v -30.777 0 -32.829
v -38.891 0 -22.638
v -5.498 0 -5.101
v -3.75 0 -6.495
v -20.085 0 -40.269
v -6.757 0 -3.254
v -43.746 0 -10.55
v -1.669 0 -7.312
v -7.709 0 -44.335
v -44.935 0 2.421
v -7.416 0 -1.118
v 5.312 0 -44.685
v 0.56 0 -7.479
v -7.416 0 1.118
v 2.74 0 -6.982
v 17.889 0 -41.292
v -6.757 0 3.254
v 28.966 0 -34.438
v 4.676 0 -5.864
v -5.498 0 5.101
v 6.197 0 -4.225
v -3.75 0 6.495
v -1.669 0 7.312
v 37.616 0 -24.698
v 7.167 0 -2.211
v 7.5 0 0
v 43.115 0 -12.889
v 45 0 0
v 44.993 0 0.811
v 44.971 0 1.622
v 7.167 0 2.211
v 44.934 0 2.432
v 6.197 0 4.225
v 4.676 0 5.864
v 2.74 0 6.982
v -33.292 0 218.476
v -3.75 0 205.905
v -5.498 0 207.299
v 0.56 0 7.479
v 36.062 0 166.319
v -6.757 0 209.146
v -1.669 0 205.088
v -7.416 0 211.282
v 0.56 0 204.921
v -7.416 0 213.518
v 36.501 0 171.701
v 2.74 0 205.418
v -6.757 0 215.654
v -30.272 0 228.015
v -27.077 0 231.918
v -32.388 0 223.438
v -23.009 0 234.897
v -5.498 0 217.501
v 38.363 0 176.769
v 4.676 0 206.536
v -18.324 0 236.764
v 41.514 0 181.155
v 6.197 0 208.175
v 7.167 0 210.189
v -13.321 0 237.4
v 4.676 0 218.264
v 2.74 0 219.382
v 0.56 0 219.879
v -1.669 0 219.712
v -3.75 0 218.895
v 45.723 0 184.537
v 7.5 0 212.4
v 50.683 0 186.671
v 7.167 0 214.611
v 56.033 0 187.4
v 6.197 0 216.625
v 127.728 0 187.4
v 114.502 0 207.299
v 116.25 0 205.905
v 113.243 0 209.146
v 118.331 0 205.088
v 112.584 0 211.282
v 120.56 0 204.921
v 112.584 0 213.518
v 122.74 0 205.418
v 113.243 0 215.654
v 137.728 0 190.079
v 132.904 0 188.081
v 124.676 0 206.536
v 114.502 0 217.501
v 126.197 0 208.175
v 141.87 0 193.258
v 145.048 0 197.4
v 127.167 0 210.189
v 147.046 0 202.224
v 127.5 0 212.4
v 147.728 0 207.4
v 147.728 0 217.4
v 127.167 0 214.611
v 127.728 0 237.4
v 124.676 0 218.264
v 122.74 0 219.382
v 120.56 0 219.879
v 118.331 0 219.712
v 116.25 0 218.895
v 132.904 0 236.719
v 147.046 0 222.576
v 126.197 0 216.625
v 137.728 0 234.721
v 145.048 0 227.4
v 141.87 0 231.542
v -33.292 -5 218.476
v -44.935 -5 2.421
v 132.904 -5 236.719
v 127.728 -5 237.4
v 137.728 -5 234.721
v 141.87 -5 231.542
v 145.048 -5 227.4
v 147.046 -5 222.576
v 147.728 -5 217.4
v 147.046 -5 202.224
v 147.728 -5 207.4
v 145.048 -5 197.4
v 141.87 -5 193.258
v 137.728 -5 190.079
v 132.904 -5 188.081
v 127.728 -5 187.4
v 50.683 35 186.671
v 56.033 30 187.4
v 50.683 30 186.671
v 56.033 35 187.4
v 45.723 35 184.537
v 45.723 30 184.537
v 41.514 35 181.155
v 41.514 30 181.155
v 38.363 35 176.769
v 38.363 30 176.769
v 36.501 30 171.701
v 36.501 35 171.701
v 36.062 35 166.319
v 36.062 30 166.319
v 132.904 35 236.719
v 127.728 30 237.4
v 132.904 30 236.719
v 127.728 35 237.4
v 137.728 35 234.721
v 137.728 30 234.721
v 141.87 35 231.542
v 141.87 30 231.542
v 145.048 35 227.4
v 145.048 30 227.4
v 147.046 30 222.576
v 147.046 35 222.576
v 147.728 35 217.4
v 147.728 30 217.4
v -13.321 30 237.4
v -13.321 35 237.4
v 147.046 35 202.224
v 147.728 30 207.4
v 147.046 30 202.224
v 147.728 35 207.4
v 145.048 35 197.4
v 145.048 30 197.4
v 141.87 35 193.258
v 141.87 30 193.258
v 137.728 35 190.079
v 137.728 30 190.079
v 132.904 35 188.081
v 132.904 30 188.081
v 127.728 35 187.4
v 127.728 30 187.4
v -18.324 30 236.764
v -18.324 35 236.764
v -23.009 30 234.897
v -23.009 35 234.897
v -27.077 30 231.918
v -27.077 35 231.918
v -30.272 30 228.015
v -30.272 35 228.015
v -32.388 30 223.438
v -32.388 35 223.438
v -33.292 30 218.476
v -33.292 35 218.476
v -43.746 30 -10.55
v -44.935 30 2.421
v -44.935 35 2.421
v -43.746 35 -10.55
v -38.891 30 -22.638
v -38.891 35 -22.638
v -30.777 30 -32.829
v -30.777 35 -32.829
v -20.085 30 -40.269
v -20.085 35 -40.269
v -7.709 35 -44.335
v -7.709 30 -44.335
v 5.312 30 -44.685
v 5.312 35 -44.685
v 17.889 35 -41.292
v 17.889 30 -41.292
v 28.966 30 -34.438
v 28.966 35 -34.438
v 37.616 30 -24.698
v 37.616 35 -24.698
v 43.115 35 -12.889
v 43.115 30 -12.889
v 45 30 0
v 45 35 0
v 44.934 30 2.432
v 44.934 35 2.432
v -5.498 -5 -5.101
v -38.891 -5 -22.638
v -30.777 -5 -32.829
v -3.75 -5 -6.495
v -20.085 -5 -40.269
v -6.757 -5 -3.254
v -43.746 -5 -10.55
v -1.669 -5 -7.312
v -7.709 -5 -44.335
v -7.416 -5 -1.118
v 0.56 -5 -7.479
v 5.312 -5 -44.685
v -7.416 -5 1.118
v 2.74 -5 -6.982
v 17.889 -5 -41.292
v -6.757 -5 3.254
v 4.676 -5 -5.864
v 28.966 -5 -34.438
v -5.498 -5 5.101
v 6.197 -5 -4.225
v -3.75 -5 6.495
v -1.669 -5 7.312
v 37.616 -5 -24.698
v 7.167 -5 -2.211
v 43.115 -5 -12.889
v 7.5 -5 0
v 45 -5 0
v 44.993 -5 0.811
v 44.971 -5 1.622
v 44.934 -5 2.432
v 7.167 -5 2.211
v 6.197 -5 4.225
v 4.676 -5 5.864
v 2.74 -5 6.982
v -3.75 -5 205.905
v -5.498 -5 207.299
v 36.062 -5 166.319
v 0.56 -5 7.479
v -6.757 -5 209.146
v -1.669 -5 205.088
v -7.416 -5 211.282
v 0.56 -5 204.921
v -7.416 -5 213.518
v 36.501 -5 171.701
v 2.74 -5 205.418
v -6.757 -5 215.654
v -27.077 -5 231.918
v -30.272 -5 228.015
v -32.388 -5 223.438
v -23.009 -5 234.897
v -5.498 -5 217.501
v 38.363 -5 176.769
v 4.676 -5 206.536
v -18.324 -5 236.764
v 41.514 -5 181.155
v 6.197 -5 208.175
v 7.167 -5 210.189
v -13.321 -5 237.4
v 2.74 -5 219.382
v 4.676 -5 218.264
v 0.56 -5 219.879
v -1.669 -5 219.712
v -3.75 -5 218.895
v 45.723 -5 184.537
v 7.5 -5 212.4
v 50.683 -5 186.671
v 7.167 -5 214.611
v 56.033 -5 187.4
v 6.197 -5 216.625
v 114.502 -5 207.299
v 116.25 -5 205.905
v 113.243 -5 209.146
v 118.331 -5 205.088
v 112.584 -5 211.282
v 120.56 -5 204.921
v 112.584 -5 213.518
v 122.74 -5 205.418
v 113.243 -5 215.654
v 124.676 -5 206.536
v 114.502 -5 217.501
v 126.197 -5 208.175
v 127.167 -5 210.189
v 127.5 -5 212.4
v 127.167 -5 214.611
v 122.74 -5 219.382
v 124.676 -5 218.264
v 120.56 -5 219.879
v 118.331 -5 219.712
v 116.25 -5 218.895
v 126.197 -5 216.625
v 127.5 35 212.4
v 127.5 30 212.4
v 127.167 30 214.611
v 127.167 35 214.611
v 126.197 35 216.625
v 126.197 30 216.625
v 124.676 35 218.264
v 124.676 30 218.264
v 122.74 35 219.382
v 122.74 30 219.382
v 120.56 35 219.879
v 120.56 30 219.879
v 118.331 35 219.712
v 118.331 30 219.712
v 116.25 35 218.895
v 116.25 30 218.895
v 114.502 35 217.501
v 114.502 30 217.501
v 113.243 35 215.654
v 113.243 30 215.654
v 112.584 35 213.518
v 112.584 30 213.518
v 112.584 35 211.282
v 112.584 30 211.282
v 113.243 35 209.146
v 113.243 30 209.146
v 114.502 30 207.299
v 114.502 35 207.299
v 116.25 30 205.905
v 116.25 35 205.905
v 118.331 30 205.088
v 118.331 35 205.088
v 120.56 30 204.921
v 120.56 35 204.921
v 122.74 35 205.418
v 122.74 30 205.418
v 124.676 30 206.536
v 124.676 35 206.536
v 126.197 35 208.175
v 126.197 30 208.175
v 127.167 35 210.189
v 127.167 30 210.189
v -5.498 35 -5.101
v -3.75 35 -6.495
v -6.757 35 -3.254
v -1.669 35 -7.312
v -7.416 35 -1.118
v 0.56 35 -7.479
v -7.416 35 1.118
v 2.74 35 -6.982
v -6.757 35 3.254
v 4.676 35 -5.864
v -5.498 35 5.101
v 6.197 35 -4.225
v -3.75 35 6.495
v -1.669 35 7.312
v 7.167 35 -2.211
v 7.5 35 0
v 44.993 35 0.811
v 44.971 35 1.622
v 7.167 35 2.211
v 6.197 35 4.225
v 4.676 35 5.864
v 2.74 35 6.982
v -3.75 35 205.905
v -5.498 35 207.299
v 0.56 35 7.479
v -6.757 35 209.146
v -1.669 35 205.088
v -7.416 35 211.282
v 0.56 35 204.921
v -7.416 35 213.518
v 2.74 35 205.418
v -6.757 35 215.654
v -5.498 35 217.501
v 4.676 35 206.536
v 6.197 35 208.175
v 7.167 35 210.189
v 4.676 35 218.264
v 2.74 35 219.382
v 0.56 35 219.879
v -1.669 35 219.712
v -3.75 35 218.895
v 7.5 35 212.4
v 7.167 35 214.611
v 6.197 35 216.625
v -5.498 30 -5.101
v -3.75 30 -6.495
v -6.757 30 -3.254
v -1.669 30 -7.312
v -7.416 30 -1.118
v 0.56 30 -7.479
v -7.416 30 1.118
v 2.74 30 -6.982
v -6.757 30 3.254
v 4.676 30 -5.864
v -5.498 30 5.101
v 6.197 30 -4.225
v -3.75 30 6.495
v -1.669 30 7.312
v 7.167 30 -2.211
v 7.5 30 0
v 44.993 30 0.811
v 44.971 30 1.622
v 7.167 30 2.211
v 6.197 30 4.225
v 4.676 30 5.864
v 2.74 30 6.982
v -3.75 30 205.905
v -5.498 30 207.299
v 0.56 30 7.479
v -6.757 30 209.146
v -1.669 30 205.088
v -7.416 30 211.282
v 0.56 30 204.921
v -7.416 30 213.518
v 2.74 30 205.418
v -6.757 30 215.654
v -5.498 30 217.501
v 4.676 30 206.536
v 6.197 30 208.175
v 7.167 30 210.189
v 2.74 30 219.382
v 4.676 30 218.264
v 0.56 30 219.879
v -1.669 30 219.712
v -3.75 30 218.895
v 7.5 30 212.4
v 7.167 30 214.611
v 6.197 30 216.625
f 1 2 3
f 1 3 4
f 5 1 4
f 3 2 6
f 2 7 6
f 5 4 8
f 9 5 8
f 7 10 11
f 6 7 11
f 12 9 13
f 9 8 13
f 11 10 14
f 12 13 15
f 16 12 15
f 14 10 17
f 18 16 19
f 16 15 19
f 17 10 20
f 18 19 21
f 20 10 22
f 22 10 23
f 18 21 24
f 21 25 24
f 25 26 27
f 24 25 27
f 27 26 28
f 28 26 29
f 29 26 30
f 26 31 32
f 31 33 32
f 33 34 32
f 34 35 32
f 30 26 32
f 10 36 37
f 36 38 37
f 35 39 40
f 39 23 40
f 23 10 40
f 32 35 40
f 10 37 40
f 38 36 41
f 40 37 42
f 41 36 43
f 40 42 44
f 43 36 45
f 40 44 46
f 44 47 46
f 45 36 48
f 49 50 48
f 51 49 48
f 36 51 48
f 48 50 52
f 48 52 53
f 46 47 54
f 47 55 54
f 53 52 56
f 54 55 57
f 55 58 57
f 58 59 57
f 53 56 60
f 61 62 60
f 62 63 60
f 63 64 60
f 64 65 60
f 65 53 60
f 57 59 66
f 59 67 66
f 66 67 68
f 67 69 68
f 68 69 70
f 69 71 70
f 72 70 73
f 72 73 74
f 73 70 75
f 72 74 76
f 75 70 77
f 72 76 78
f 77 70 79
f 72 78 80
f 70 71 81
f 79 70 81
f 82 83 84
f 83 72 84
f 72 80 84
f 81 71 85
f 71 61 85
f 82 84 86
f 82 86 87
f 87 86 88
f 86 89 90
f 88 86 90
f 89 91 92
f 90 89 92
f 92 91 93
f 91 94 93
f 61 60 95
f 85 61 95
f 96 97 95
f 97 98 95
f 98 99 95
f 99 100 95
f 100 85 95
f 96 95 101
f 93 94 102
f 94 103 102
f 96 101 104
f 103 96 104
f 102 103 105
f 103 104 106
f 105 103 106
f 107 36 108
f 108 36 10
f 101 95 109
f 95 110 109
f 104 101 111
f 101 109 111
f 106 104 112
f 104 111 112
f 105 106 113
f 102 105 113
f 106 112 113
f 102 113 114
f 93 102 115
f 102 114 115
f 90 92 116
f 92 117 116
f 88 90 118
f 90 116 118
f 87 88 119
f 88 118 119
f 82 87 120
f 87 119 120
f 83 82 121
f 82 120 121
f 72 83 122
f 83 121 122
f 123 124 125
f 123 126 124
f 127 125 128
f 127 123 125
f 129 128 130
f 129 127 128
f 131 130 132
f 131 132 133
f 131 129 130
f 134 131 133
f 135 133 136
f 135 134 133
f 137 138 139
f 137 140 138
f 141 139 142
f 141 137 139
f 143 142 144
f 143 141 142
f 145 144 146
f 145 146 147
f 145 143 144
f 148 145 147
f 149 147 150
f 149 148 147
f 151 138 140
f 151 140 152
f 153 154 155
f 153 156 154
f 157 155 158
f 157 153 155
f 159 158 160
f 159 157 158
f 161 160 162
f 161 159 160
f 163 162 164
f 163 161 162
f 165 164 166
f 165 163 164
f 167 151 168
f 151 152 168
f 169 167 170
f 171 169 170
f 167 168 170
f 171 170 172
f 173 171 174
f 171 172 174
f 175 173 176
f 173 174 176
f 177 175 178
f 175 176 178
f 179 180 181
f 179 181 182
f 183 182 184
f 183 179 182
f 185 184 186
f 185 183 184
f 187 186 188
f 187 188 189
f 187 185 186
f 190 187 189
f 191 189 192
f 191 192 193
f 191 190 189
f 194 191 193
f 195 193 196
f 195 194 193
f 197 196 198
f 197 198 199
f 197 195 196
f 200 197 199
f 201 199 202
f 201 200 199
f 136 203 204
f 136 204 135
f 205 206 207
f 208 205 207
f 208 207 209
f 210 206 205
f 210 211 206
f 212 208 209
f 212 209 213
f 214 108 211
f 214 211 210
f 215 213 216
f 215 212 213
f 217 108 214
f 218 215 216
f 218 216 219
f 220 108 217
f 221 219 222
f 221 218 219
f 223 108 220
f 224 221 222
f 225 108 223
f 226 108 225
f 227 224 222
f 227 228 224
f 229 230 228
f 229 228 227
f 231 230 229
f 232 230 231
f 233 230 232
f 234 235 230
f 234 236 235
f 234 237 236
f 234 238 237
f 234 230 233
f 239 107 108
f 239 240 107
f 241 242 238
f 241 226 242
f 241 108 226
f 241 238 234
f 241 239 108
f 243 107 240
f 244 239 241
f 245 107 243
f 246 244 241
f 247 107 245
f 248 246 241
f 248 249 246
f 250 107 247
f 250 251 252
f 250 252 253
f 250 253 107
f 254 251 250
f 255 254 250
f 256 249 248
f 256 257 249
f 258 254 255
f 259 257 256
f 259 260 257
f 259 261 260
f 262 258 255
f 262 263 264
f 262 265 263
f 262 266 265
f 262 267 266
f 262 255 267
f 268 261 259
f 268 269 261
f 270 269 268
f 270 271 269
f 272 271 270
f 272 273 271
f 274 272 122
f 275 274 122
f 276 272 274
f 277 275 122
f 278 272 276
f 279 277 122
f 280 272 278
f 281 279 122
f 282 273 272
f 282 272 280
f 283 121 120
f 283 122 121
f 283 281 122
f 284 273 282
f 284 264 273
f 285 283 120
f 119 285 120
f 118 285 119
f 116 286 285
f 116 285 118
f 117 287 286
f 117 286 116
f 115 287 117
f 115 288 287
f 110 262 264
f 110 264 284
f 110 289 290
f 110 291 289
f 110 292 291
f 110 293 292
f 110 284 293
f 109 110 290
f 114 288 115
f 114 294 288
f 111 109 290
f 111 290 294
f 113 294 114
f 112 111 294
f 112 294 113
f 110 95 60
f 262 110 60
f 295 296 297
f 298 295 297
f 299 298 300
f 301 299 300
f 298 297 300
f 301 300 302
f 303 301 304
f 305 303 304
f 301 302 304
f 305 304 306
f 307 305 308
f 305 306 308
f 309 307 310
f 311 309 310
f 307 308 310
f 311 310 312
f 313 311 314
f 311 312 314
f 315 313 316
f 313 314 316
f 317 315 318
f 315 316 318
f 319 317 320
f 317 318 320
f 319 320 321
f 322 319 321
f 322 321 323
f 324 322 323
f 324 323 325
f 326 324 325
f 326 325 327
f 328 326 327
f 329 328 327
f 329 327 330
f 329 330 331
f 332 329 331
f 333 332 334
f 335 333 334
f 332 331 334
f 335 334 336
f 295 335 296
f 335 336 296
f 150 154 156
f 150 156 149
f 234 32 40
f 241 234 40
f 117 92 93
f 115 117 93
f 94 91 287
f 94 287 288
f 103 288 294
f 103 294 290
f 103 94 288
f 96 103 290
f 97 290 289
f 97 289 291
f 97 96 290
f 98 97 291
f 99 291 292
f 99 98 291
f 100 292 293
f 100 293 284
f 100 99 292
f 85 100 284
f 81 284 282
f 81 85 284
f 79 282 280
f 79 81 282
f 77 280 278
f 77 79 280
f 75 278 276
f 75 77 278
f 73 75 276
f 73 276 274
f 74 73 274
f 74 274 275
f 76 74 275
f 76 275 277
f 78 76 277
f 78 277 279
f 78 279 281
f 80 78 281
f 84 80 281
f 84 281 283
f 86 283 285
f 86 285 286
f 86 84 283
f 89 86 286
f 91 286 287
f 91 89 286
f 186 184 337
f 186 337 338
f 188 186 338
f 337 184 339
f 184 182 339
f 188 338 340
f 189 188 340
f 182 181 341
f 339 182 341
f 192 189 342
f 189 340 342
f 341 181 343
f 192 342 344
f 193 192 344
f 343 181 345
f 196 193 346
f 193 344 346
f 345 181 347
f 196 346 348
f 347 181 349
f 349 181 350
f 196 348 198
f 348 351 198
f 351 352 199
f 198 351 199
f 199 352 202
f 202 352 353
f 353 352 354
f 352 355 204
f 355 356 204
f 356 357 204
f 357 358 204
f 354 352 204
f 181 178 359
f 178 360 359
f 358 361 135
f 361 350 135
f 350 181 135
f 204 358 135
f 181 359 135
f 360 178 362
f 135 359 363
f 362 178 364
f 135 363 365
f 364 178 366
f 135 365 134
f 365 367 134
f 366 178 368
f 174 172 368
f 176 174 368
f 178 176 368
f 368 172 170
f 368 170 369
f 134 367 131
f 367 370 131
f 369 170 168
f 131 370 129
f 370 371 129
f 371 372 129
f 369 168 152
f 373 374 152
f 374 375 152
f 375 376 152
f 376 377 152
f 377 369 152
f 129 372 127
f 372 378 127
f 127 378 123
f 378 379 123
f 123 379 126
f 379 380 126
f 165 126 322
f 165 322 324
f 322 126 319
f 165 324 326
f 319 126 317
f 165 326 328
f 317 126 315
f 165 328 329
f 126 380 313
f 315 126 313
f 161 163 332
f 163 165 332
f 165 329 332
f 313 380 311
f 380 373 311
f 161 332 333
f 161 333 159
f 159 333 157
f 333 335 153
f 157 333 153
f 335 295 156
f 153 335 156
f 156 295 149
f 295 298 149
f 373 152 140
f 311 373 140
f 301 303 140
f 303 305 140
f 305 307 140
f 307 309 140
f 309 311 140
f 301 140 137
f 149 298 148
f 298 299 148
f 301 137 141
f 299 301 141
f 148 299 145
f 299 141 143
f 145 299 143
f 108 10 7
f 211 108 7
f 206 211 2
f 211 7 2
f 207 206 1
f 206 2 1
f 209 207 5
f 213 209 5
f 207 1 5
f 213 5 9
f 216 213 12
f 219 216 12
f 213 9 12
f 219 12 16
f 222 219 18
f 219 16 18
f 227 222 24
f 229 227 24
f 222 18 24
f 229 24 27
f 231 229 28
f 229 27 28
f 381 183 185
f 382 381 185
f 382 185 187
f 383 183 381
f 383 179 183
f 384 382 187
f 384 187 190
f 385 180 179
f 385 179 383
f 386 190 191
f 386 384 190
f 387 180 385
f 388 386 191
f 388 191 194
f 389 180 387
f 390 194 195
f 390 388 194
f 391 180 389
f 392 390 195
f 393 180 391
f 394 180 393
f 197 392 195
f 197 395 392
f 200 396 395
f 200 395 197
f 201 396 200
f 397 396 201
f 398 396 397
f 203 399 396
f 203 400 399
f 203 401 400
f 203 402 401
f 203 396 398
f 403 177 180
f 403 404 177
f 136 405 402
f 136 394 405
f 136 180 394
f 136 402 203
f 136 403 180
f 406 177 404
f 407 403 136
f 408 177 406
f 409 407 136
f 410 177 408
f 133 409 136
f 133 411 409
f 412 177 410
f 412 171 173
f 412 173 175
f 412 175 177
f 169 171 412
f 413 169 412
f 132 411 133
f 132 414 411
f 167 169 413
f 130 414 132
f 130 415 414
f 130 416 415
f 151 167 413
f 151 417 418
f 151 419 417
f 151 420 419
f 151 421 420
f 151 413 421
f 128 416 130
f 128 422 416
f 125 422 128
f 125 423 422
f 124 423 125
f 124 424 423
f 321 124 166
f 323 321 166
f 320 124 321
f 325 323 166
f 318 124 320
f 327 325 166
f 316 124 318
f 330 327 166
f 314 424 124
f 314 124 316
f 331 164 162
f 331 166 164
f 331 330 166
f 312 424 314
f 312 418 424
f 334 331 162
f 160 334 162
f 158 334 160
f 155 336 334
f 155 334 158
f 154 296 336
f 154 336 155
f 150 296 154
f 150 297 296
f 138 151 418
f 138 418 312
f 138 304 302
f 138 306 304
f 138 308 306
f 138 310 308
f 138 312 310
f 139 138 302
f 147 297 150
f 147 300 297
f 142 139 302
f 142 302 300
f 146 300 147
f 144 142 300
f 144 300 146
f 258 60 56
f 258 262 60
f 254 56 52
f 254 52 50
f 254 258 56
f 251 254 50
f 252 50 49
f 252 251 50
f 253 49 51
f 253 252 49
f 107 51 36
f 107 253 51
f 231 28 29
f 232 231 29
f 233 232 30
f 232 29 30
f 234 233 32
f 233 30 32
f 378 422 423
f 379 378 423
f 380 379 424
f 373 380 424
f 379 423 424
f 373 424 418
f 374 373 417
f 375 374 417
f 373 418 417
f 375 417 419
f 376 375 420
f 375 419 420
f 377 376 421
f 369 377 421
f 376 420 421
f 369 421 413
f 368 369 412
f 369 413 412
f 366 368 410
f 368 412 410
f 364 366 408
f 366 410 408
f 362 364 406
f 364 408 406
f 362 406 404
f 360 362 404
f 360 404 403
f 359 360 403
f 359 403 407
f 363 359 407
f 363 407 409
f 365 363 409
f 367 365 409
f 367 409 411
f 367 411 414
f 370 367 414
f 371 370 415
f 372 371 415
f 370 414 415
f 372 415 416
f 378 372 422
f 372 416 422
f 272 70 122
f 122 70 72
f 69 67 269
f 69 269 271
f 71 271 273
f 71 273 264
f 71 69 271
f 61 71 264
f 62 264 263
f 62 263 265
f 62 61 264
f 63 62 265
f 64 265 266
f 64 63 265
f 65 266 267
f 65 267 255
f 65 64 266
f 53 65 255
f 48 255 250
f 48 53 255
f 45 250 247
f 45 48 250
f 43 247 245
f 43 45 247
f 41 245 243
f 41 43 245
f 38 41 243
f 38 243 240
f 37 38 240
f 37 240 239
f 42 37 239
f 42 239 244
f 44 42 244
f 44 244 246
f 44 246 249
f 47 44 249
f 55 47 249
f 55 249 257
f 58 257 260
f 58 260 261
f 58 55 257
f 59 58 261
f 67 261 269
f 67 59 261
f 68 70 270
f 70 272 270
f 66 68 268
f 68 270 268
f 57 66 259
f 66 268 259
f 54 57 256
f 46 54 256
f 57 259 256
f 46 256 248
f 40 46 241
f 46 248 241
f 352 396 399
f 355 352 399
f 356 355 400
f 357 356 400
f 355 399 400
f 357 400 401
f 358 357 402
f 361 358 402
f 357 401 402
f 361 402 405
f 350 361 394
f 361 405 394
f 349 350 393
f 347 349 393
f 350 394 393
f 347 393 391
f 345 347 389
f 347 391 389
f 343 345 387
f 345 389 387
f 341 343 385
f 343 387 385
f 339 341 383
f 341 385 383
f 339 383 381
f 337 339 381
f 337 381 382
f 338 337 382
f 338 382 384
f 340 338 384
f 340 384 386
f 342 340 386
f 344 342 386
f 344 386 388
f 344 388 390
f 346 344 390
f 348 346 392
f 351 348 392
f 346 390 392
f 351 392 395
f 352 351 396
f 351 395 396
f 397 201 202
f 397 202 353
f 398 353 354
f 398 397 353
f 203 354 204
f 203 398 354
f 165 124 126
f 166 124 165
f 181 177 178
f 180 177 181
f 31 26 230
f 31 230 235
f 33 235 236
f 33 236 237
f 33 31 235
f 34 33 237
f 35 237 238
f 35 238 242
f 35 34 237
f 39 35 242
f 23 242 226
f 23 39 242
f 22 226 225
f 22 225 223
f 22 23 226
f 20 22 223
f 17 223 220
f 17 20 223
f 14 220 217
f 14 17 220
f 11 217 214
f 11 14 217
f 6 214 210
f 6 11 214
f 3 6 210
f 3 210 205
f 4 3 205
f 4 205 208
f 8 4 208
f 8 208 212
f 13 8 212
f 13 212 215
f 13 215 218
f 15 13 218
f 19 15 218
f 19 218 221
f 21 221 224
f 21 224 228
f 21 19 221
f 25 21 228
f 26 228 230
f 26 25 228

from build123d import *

# Parameters (mm, degrees)
F0_R     = 7.5
F1_DEPTH = 5
F2_R     = 20
F3_R     = 20
F4_R     = 20
F5_R     = 20


with BuildPart() as f1:
    # F0 (on Front) → F1 (new body)
    with BuildSketch(Plane.XZ):
        with BuildLine():
            ThreePointArc((-44.934803, 2.421455), (-0.005514, 45), (44.934209, 2.432468))
            Line((44.934209, 2.432468), (34.921178, 187.4))
            Line((34.921178, 187.4), (147.727768, 187.4))
            Line((147.727768, 187.4), (147.727768, 237.4))
            Line((147.727768, 237.4), (-32.272232, 237.4))
            Line((-32.272232, 237.4), (-44.934803, 2.421455))
        make_face()
        with Locations((0, 212.4)):
            Circle(F0_R, mode=Mode.SUBTRACT)
        with Locations((120, 212.4)):
            Circle(F0_R, mode=Mode.SUBTRACT)
        with BuildLine():
            ThreePointArc((-44.934803, 2.421455), (-1.211166, -44.983698), (45, 0))
            ThreePointArc((45, 0), (44.983549, 1.216679), (44.934209, 2.432468))
            ThreePointArc((44.934209, 2.432468), (-0.005514, 45), (-44.934803, 2.421455))
        make_face()
        Circle(F0_R, mode=Mode.SUBTRACT)
    extrude(amount=F1_DEPTH)

    # F2
    f2_edges = [f1.edges().sort_by_distance(p)[0] for p in [
        (147.727768, -2.5, 237.4),
    ]]
    fillet(f2_edges, radius=F2_R)

    # F3
    f3_edges = [f1.edges().sort_by_distance(p)[0] for p in [
        (147.727768, -2.5, 187.4),
    ]]
    fillet(f3_edges, radius=F3_R)

    # F4
    f4_edges = [f1.edges().sort_by_distance(p)[0] for p in [
        (-32.272232, -2.5, 237.4),
    ]]
    fillet(f4_edges, radius=F4_R)

    # F5
    f5_edges = [f1.edges().sort_by_distance(p)[0] for p in [
        (34.921178, -2.5, 187.4),
    ]]
    fillet(f5_edges, radius=F5_R)


with BuildPart() as f7_1:
    # F7: instance of F1
    add(f1.part.mirror(Plane.XZ.offset(-15)))


solid = Compound([f1.part, f7_1.part])
